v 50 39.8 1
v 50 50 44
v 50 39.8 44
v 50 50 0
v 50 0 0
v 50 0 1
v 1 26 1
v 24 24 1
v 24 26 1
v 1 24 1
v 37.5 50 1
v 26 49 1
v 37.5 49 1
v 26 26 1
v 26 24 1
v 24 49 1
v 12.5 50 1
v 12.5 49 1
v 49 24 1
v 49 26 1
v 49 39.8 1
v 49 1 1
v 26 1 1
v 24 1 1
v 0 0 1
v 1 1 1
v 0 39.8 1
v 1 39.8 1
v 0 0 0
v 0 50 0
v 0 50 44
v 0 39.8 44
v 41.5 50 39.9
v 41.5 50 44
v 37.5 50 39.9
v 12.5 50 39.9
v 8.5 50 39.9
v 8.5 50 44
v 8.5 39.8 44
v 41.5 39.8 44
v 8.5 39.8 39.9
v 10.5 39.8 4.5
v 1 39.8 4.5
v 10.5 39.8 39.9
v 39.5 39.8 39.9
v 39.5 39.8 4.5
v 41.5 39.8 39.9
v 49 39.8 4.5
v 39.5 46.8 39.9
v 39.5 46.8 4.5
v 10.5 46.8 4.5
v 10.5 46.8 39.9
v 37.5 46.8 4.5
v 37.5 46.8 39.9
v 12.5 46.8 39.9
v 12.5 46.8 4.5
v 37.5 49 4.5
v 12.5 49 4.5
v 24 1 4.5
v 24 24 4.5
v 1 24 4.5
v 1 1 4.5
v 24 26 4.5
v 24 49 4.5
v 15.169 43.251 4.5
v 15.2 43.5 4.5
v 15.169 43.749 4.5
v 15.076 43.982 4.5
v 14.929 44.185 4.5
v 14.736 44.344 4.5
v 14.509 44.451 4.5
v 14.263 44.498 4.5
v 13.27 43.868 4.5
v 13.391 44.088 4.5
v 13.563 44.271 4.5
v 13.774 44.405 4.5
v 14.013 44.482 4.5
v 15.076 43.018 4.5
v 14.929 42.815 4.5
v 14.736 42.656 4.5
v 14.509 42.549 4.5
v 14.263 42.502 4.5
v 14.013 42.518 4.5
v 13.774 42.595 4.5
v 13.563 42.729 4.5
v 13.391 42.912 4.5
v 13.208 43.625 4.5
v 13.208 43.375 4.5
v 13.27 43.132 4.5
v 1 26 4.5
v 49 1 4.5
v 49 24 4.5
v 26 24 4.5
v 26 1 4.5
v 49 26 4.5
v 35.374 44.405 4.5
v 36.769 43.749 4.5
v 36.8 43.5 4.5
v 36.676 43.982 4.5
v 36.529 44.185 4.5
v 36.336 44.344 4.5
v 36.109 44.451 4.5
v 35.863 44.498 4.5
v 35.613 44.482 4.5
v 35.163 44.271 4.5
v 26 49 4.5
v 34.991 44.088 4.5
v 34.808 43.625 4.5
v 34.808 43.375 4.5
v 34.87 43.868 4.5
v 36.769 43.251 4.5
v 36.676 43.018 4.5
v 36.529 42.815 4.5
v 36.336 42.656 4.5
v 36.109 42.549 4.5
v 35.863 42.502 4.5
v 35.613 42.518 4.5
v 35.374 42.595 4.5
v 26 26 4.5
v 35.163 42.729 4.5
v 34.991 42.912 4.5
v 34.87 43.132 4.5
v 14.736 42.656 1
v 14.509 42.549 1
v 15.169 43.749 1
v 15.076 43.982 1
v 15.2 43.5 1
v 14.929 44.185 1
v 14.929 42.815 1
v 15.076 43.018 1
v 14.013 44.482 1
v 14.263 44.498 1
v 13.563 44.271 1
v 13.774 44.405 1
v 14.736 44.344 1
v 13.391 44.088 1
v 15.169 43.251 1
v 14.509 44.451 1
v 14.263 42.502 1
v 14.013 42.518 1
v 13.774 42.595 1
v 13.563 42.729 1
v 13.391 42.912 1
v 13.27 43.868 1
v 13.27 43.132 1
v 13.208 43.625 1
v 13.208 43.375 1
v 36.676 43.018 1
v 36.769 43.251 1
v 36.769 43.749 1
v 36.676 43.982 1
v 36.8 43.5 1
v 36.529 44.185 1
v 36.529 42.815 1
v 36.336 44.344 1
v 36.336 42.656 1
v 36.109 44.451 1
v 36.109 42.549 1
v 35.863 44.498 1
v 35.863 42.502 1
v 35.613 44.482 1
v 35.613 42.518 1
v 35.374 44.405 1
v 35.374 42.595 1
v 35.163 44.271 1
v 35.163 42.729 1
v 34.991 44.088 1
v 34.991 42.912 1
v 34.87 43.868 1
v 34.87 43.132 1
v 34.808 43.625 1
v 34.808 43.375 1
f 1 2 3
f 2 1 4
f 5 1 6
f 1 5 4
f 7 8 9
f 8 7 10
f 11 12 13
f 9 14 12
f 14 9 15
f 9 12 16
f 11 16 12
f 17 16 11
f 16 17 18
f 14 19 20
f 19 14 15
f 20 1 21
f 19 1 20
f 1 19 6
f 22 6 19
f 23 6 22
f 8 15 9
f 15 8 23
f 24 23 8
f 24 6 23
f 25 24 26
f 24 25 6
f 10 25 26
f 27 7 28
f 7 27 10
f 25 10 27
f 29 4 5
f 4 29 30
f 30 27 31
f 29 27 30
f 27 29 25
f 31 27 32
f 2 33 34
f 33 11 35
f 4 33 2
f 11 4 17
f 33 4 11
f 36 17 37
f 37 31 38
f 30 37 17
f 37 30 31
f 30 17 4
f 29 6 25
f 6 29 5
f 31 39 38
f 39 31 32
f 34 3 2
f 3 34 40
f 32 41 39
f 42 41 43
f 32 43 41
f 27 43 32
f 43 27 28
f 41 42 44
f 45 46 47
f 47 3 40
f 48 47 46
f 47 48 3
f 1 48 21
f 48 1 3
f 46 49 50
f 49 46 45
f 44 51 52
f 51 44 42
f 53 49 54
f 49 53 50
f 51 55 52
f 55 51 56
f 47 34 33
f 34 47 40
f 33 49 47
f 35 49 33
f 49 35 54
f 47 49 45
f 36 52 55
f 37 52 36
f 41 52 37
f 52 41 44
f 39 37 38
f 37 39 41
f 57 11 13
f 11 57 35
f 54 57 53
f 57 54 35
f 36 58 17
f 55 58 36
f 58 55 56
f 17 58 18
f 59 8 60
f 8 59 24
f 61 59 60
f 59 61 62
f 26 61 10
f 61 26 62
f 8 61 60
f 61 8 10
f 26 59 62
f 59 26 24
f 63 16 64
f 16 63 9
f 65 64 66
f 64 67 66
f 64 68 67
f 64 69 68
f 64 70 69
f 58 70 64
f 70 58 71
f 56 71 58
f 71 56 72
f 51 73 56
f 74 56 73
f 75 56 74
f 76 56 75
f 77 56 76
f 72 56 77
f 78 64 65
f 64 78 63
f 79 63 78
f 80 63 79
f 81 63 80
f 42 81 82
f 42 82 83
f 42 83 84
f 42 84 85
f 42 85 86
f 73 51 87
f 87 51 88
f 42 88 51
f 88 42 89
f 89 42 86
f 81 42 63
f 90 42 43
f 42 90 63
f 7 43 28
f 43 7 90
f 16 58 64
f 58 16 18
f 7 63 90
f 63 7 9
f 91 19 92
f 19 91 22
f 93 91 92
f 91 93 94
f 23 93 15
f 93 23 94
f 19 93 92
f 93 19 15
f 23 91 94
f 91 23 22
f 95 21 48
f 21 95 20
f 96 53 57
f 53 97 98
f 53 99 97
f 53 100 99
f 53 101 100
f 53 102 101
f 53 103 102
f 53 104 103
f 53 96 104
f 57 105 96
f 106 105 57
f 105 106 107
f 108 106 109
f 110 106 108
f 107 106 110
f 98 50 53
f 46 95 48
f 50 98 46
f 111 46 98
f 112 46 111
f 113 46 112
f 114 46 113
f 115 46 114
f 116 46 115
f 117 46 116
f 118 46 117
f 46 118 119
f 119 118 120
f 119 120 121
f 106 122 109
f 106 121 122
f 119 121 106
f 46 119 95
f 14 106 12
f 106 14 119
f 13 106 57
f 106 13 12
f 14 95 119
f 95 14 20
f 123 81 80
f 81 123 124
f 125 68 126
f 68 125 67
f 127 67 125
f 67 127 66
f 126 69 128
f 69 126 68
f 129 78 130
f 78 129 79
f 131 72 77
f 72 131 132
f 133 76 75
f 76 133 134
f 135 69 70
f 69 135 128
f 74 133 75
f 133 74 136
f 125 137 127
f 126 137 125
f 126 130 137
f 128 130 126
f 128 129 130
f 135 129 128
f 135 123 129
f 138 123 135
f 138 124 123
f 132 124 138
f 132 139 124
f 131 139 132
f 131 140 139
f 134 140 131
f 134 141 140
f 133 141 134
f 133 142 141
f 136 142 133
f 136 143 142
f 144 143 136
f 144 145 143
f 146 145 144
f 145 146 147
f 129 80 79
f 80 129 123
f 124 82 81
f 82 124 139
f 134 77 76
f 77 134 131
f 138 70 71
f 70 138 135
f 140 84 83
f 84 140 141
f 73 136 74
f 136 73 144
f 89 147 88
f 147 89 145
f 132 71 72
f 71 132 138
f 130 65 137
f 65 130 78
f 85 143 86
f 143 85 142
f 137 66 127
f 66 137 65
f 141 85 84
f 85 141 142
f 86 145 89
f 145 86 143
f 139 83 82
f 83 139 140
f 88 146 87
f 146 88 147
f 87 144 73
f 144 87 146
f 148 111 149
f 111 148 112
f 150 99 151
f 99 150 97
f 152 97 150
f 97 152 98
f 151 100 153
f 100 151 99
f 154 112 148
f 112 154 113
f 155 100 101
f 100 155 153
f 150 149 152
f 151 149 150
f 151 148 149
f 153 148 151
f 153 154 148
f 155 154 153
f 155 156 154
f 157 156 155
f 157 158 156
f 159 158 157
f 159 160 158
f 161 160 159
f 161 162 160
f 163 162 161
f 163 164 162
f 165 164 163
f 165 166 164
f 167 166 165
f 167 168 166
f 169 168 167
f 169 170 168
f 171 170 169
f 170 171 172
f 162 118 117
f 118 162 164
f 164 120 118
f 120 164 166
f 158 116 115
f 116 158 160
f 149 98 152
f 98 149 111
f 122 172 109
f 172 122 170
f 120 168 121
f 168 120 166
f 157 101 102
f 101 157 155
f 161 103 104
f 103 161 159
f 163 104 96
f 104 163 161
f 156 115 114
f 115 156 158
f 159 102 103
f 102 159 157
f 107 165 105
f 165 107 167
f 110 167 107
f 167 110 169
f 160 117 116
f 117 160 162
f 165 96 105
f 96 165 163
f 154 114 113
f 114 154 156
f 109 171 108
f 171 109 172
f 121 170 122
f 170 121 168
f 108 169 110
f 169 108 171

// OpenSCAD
_basis = 25;

module square_door_hole(x=2, y=2, border=0, base=false) {
    base_buffer = base ? 6 : 0;
    if (x < 3) {
        color("DarkGrey") difference() {
            children(0);
            
            translate([0,-2.5-10.2+_basis*y,base_buffer]) union() {
                translate([_basis-29/2,-_basis/2-6,0]) cube([29,_basis+3,51.2]);
                translate([_basis-33/2,-_basis/2-2,_basis*2-6-4.1]) cube([33,_basis+3,4.2]);
                translate([_basis-25/2,-1,0]) cube([25,18.7,51.2]);
            }
        }
        difference() {
            children(1);
            translate([0,-2.5-10.2+_basis*y,base_buffer]) color("DarkGrey") translate([_basis/2+1.7,6.2,1]) cylinder(50,1,1,$fn=25);
            translate([0,-2.5-10.2+_basis*y,base_buffer]) color("DarkGrey") translate([2*_basis-(_basis/2+1.7),6.2,1]) cylinder(50,1,1,$fn=25);
        }
    } else {
        move = (x-2) * 12.5;
        color("DarkGrey") difference() {
            children(0);
            translate([-move,-2.5-10.2+_basis*y,base_buffer]) union() {
                translate([_basis*2-(29+28)/2,-_basis/2-6,0]) cube([29+28,_basis+3,51.2]);
                translate([_basis*2-(33+28)/2,-_basis/2-2,_basis*2-4.7+1.6]) cube([33+28,_basis+3,4.2]);
                translate([_basis*2-(25+28)/2,-1,0]) cube([25+28,18.7,51.2]);
            }
        }
        difference() {
            children(1);
            translate([-move,-2.5-10.2+_basis*y,base_buffer]) color("DarkGrey") translate([_basis+0.4,6.2,1]) cylinder(50,1,1,$fn=25);
            translate([-move,-2.5-10.2+_basis*y,base_buffer]) color("DarkGrey") translate([3*_basis-0.4,6.2,1]) cylinder(50,1,1,$fn=25);
        }
    }
}

module square_door(x=2, y=2, base=false) {
    h = 2;
    base_buffer = base ? 6 : 0;
    
    square_door_hole(x=x, y=y, base=base) {
        color("Grey") {
            cube([_basis*x,_basis*y,1+base_buffer]);
            translate([0,_basis*y-10.2,0]) cube([_basis*x,10.2,_basis*h-6+base_buffer]);
        }
        union() {
            color("Grey") cube([_basis*x,_basis*y,1+base_buffer]);
            translate([0,0,base_buffer]) color("LightGray") {
                for (i = [0:x-1]) {
                    for (j = [0:y-1]) {
                        translate([_basis*i+1,_basis*j+1,0]) cube([23,23,4.5]);
                    }
                }
            }
        }
    }
}

square_door(x=2, y=2, base=false);
